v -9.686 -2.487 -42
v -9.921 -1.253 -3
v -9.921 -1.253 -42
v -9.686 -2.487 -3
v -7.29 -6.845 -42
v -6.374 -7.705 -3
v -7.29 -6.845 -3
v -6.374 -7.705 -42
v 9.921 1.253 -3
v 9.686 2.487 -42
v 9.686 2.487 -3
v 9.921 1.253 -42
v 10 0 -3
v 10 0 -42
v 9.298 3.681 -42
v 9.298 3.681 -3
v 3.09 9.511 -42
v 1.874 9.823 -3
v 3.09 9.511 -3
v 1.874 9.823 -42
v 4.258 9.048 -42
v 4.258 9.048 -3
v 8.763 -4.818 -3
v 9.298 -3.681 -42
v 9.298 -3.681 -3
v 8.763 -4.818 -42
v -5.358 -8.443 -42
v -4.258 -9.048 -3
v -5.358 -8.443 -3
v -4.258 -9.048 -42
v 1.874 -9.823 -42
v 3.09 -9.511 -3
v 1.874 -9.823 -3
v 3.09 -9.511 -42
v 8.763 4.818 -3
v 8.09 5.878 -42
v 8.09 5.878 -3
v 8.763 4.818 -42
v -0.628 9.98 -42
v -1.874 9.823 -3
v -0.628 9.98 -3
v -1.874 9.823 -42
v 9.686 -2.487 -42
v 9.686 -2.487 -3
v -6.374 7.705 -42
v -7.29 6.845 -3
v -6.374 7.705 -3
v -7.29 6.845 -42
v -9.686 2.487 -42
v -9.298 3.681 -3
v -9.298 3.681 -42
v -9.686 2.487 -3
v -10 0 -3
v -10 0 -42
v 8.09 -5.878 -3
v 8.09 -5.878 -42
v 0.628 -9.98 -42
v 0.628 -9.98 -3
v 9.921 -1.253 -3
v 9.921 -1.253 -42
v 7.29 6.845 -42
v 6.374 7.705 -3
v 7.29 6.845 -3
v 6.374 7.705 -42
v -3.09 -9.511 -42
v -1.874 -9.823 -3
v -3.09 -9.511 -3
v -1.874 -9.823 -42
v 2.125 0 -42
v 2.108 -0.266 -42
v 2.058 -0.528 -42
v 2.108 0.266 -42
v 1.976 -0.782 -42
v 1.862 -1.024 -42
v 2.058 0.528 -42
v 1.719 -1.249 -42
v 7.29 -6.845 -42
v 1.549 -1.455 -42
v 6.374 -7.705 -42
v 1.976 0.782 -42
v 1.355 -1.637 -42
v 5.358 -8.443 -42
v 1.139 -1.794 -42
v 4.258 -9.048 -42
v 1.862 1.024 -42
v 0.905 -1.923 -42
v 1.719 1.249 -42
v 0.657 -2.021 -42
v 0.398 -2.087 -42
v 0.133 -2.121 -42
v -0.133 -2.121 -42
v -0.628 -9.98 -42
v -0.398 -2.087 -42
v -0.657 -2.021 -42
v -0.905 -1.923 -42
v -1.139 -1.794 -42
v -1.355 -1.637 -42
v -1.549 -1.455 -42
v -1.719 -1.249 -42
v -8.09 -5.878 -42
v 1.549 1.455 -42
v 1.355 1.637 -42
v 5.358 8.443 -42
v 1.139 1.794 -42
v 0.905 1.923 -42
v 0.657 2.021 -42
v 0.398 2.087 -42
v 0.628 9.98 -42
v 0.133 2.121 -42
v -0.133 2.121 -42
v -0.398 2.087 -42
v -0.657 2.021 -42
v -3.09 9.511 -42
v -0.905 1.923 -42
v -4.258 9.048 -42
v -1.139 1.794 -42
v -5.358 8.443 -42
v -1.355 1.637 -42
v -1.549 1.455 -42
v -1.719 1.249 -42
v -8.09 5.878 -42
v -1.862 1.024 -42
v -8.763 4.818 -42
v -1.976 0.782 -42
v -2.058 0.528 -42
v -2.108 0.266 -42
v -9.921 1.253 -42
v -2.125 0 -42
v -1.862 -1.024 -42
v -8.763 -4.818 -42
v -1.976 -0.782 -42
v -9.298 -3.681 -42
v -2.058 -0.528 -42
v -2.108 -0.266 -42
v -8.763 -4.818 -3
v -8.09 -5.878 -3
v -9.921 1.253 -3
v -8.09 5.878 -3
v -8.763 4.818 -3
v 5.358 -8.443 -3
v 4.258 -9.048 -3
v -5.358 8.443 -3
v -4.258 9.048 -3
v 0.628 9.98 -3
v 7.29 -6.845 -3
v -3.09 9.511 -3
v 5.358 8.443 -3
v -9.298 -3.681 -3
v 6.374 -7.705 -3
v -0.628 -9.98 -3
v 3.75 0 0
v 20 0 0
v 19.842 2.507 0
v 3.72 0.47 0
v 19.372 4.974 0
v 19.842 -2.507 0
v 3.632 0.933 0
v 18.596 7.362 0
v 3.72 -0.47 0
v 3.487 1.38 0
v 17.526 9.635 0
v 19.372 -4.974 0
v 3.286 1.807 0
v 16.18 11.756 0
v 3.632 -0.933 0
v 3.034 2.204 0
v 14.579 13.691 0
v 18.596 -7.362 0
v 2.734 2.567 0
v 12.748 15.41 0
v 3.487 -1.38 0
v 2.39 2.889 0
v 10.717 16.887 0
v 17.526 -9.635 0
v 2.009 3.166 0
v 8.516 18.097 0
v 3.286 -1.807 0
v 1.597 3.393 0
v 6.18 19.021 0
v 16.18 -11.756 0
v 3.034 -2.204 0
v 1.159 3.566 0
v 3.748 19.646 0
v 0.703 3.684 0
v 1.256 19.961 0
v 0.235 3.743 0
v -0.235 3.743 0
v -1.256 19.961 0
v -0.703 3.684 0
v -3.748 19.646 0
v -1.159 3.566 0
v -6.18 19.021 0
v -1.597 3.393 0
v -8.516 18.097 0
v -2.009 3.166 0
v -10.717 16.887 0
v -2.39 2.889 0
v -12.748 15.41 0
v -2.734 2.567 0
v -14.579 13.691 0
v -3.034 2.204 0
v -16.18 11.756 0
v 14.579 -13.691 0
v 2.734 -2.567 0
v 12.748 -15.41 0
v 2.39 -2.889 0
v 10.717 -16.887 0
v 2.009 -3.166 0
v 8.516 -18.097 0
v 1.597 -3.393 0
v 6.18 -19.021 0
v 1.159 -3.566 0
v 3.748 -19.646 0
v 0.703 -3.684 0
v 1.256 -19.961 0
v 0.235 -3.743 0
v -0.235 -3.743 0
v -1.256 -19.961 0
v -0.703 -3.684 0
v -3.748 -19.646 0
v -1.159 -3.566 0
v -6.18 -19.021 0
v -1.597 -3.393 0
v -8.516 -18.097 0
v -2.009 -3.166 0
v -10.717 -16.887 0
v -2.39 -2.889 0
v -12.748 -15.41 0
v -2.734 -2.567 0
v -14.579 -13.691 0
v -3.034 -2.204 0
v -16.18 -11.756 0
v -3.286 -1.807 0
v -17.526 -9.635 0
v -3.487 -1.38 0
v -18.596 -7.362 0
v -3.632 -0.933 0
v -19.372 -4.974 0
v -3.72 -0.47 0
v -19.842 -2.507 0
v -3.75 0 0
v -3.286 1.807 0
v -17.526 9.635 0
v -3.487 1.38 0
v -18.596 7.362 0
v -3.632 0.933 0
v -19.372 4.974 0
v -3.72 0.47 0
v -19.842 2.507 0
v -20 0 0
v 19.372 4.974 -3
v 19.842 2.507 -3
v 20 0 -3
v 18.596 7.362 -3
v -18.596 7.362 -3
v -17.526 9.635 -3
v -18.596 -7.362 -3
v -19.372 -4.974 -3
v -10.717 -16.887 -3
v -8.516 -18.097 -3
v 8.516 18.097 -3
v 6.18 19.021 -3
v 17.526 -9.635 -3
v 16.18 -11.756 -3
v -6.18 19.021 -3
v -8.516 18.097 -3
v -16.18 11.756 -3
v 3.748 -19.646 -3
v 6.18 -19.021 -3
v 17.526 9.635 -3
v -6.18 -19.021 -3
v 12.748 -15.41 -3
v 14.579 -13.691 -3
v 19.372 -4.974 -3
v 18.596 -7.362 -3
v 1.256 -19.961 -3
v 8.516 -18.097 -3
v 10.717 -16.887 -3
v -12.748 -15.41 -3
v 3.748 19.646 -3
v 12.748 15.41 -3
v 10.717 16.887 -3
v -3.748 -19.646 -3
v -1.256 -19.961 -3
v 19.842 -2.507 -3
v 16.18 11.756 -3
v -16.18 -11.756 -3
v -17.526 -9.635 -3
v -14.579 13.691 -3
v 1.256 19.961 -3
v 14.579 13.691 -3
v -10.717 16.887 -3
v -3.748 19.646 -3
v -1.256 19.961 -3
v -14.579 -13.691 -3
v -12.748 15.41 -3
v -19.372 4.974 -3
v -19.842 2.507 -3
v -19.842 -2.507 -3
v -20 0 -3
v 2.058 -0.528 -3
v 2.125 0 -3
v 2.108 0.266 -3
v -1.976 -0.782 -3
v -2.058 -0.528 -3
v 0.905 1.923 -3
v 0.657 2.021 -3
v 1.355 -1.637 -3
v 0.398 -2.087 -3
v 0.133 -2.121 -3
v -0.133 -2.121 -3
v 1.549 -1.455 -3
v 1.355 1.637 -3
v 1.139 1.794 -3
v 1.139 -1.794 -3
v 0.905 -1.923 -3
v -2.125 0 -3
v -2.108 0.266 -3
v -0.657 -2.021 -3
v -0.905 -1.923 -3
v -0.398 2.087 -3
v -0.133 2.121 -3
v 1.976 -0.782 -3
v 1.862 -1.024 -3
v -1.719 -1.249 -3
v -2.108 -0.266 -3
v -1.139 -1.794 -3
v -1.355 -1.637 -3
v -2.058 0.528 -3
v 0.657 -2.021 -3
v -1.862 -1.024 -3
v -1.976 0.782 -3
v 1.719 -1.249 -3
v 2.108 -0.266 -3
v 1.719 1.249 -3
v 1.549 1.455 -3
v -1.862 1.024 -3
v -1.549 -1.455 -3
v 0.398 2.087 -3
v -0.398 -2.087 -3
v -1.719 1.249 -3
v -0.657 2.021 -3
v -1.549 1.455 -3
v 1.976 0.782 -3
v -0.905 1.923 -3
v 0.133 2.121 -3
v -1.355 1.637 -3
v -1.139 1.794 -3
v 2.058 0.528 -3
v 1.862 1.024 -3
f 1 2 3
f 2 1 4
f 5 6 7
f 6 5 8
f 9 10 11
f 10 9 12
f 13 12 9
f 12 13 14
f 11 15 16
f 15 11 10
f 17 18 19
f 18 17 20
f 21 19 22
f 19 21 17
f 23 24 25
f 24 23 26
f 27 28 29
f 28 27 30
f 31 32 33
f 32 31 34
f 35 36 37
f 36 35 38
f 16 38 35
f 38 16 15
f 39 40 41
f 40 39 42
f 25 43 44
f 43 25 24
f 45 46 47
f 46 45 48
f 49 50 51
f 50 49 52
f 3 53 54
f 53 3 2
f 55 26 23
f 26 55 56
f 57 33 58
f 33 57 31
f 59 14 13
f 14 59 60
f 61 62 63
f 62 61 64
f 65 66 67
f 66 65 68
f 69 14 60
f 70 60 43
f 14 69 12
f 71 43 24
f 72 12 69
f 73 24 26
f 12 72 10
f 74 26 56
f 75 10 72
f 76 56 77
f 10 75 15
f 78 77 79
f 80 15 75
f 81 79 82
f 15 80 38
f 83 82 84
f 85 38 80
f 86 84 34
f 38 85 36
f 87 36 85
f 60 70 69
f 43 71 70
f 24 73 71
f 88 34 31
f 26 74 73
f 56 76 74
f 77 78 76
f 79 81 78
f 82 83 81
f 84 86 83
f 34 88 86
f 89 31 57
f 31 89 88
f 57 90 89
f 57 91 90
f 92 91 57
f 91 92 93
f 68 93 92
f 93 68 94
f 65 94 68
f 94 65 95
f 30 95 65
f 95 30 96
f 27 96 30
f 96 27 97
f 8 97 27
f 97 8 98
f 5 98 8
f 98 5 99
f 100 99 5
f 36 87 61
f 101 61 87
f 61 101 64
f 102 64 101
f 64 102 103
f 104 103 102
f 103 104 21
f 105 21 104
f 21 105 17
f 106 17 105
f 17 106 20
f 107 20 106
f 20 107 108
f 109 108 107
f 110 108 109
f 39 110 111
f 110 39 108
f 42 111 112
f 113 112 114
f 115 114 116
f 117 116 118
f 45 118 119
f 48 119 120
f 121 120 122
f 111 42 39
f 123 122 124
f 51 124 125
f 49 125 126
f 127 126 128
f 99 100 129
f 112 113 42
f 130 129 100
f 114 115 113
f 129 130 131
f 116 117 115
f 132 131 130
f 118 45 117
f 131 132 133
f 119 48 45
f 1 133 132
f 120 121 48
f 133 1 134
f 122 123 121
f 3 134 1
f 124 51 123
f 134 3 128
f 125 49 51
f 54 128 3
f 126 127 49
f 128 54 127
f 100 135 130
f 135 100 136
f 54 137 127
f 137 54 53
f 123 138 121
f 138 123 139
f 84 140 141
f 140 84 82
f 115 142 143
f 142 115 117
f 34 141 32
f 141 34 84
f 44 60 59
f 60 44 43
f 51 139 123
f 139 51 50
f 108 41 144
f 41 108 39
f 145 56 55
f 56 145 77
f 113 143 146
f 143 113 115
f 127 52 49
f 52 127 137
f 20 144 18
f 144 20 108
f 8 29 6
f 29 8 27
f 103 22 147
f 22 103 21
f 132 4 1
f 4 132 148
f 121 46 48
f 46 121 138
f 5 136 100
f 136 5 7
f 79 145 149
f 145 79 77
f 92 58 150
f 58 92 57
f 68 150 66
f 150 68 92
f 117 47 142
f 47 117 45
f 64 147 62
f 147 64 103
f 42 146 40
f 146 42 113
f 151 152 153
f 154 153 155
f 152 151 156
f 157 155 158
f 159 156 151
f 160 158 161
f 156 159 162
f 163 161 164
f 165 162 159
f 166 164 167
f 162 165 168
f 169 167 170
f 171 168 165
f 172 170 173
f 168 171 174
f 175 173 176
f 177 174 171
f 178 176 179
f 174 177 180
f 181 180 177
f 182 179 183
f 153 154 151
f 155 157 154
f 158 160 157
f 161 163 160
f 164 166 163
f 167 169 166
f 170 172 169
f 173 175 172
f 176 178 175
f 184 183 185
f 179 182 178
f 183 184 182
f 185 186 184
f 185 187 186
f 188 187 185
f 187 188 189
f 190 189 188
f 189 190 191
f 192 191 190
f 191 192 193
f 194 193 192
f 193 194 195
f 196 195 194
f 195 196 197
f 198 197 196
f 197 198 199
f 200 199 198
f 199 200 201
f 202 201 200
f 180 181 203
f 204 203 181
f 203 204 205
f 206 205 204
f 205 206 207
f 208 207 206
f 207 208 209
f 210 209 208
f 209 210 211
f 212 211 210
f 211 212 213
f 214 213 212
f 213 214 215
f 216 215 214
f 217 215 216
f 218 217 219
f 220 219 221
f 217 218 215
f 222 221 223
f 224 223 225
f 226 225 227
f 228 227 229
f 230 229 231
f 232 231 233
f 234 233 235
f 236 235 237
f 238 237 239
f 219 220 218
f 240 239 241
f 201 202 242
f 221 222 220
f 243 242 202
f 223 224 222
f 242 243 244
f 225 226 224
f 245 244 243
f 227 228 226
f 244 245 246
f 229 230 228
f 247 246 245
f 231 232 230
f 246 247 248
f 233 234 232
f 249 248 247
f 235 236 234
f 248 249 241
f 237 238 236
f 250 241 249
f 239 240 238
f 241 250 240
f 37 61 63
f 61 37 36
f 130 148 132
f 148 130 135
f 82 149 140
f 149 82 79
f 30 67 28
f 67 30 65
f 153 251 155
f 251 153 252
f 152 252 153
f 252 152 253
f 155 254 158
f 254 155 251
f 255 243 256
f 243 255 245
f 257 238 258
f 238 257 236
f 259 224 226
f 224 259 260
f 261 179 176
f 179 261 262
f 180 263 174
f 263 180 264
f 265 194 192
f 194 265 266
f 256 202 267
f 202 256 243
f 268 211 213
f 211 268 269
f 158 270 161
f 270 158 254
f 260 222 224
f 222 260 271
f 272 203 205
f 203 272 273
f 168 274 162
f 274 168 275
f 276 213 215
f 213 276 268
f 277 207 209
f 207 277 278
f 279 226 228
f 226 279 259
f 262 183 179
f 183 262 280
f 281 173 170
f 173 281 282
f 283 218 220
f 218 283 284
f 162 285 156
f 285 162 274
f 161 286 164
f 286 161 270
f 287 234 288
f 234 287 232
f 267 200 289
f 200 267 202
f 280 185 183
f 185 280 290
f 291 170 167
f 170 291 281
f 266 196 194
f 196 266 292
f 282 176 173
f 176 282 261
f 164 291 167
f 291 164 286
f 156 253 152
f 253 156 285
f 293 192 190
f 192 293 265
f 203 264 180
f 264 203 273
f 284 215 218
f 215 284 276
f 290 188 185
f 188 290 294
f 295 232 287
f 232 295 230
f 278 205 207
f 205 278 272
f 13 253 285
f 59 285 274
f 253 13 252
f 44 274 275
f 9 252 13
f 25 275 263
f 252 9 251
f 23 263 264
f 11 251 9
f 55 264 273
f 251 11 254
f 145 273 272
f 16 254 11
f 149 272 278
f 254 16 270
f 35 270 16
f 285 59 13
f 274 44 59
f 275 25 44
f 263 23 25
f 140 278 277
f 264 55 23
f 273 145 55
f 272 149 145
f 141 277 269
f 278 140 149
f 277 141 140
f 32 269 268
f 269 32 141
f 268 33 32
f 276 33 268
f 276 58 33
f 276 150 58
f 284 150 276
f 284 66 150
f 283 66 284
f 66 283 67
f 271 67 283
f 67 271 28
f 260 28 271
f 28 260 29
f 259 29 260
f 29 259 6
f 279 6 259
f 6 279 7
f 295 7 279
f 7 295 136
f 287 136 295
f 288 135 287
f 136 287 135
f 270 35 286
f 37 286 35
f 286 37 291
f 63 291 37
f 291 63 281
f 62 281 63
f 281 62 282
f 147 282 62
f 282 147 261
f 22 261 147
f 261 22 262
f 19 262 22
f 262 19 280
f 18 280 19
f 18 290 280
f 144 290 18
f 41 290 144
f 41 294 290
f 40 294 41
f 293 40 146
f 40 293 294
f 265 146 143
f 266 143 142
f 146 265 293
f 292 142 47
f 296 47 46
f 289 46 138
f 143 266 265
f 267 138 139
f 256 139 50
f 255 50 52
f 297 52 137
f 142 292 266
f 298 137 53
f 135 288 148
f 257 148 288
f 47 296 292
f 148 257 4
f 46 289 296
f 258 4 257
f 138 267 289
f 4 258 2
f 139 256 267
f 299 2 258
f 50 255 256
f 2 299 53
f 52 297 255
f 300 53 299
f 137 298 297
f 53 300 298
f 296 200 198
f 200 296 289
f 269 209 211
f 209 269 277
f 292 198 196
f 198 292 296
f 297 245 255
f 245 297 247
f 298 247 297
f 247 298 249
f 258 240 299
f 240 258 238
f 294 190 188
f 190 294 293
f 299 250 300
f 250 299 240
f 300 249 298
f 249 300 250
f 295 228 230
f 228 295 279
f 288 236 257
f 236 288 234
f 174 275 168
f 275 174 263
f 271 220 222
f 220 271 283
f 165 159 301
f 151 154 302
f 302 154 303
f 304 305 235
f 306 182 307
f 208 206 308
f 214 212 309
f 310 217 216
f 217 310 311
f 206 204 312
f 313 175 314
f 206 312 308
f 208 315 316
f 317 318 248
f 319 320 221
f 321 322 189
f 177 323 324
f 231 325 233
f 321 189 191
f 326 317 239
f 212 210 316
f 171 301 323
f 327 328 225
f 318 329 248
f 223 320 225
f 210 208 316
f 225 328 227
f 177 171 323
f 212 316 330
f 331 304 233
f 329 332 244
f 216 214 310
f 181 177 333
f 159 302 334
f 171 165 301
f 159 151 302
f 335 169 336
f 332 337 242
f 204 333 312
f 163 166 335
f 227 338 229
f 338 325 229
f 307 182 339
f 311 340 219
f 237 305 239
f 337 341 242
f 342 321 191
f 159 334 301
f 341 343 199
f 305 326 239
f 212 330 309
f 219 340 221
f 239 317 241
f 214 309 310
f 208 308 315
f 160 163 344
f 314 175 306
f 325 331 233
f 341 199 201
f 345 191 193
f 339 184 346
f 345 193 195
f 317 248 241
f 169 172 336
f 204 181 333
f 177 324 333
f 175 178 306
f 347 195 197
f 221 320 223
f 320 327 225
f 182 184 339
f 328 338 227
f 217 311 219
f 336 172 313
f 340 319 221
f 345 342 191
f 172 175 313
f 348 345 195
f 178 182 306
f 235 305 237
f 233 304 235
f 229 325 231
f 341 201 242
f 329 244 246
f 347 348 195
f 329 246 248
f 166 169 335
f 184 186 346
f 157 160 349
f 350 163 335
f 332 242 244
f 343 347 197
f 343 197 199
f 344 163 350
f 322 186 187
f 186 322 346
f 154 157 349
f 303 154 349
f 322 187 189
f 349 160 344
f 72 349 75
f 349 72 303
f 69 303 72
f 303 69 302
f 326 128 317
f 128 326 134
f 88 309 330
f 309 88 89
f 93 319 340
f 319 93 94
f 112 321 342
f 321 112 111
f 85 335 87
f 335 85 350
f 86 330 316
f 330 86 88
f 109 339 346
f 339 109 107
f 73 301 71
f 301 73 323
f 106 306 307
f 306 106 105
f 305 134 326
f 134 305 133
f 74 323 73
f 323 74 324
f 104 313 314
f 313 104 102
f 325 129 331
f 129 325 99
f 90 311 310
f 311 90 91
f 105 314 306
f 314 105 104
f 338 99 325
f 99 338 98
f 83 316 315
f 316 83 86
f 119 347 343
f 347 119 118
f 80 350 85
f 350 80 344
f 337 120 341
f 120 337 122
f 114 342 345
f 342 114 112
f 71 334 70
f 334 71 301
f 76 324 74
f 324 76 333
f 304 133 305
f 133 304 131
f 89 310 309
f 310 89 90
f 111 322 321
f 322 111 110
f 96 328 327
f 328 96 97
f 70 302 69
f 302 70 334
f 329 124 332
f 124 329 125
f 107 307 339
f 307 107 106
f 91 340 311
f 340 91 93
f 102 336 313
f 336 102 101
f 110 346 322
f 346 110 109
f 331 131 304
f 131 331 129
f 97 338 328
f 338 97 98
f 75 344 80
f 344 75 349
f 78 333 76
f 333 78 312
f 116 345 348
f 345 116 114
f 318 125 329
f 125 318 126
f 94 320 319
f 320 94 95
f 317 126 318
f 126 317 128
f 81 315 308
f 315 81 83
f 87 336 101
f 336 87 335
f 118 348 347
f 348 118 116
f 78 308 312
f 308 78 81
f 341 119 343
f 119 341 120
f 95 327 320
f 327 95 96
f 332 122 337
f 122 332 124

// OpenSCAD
$fn = 50;


difference() {
	union() {
		translate(v = [0, 0, -42.0000000000]) {
			cylinder(h = 42, r = 10.0000000000);
		}
		translate(v = [0, 0, -3.0000000000]) {
			cylinder(h = 3, r = 20.0000000000);
		}
	}
	union() {
		translate(v = [0, 0, 0]) {
			rotate(a = [0, 0, 0]) {
				difference() {
					union() {
						#translate(v = [0, 0, -42.0000000000]) {
							cylinder(h = 42, r = 2.0000000000);
						}
						#translate(v = [0, 0, -3]) {
							cylinder(h = 3, r1 = 2.1250000000, r2 = 3.7500000000);
						}
						#translate(v = [0, 0, -42.0000000000]) {
							cylinder(h = 42, r = 2.1250000000);
						}
						#translate(v = [0, 0, -42.0000000000]) {
							cylinder(h = 42, r = 2.0000000000);
						}
					}
					union();
				}
			}
		}
	}
}
